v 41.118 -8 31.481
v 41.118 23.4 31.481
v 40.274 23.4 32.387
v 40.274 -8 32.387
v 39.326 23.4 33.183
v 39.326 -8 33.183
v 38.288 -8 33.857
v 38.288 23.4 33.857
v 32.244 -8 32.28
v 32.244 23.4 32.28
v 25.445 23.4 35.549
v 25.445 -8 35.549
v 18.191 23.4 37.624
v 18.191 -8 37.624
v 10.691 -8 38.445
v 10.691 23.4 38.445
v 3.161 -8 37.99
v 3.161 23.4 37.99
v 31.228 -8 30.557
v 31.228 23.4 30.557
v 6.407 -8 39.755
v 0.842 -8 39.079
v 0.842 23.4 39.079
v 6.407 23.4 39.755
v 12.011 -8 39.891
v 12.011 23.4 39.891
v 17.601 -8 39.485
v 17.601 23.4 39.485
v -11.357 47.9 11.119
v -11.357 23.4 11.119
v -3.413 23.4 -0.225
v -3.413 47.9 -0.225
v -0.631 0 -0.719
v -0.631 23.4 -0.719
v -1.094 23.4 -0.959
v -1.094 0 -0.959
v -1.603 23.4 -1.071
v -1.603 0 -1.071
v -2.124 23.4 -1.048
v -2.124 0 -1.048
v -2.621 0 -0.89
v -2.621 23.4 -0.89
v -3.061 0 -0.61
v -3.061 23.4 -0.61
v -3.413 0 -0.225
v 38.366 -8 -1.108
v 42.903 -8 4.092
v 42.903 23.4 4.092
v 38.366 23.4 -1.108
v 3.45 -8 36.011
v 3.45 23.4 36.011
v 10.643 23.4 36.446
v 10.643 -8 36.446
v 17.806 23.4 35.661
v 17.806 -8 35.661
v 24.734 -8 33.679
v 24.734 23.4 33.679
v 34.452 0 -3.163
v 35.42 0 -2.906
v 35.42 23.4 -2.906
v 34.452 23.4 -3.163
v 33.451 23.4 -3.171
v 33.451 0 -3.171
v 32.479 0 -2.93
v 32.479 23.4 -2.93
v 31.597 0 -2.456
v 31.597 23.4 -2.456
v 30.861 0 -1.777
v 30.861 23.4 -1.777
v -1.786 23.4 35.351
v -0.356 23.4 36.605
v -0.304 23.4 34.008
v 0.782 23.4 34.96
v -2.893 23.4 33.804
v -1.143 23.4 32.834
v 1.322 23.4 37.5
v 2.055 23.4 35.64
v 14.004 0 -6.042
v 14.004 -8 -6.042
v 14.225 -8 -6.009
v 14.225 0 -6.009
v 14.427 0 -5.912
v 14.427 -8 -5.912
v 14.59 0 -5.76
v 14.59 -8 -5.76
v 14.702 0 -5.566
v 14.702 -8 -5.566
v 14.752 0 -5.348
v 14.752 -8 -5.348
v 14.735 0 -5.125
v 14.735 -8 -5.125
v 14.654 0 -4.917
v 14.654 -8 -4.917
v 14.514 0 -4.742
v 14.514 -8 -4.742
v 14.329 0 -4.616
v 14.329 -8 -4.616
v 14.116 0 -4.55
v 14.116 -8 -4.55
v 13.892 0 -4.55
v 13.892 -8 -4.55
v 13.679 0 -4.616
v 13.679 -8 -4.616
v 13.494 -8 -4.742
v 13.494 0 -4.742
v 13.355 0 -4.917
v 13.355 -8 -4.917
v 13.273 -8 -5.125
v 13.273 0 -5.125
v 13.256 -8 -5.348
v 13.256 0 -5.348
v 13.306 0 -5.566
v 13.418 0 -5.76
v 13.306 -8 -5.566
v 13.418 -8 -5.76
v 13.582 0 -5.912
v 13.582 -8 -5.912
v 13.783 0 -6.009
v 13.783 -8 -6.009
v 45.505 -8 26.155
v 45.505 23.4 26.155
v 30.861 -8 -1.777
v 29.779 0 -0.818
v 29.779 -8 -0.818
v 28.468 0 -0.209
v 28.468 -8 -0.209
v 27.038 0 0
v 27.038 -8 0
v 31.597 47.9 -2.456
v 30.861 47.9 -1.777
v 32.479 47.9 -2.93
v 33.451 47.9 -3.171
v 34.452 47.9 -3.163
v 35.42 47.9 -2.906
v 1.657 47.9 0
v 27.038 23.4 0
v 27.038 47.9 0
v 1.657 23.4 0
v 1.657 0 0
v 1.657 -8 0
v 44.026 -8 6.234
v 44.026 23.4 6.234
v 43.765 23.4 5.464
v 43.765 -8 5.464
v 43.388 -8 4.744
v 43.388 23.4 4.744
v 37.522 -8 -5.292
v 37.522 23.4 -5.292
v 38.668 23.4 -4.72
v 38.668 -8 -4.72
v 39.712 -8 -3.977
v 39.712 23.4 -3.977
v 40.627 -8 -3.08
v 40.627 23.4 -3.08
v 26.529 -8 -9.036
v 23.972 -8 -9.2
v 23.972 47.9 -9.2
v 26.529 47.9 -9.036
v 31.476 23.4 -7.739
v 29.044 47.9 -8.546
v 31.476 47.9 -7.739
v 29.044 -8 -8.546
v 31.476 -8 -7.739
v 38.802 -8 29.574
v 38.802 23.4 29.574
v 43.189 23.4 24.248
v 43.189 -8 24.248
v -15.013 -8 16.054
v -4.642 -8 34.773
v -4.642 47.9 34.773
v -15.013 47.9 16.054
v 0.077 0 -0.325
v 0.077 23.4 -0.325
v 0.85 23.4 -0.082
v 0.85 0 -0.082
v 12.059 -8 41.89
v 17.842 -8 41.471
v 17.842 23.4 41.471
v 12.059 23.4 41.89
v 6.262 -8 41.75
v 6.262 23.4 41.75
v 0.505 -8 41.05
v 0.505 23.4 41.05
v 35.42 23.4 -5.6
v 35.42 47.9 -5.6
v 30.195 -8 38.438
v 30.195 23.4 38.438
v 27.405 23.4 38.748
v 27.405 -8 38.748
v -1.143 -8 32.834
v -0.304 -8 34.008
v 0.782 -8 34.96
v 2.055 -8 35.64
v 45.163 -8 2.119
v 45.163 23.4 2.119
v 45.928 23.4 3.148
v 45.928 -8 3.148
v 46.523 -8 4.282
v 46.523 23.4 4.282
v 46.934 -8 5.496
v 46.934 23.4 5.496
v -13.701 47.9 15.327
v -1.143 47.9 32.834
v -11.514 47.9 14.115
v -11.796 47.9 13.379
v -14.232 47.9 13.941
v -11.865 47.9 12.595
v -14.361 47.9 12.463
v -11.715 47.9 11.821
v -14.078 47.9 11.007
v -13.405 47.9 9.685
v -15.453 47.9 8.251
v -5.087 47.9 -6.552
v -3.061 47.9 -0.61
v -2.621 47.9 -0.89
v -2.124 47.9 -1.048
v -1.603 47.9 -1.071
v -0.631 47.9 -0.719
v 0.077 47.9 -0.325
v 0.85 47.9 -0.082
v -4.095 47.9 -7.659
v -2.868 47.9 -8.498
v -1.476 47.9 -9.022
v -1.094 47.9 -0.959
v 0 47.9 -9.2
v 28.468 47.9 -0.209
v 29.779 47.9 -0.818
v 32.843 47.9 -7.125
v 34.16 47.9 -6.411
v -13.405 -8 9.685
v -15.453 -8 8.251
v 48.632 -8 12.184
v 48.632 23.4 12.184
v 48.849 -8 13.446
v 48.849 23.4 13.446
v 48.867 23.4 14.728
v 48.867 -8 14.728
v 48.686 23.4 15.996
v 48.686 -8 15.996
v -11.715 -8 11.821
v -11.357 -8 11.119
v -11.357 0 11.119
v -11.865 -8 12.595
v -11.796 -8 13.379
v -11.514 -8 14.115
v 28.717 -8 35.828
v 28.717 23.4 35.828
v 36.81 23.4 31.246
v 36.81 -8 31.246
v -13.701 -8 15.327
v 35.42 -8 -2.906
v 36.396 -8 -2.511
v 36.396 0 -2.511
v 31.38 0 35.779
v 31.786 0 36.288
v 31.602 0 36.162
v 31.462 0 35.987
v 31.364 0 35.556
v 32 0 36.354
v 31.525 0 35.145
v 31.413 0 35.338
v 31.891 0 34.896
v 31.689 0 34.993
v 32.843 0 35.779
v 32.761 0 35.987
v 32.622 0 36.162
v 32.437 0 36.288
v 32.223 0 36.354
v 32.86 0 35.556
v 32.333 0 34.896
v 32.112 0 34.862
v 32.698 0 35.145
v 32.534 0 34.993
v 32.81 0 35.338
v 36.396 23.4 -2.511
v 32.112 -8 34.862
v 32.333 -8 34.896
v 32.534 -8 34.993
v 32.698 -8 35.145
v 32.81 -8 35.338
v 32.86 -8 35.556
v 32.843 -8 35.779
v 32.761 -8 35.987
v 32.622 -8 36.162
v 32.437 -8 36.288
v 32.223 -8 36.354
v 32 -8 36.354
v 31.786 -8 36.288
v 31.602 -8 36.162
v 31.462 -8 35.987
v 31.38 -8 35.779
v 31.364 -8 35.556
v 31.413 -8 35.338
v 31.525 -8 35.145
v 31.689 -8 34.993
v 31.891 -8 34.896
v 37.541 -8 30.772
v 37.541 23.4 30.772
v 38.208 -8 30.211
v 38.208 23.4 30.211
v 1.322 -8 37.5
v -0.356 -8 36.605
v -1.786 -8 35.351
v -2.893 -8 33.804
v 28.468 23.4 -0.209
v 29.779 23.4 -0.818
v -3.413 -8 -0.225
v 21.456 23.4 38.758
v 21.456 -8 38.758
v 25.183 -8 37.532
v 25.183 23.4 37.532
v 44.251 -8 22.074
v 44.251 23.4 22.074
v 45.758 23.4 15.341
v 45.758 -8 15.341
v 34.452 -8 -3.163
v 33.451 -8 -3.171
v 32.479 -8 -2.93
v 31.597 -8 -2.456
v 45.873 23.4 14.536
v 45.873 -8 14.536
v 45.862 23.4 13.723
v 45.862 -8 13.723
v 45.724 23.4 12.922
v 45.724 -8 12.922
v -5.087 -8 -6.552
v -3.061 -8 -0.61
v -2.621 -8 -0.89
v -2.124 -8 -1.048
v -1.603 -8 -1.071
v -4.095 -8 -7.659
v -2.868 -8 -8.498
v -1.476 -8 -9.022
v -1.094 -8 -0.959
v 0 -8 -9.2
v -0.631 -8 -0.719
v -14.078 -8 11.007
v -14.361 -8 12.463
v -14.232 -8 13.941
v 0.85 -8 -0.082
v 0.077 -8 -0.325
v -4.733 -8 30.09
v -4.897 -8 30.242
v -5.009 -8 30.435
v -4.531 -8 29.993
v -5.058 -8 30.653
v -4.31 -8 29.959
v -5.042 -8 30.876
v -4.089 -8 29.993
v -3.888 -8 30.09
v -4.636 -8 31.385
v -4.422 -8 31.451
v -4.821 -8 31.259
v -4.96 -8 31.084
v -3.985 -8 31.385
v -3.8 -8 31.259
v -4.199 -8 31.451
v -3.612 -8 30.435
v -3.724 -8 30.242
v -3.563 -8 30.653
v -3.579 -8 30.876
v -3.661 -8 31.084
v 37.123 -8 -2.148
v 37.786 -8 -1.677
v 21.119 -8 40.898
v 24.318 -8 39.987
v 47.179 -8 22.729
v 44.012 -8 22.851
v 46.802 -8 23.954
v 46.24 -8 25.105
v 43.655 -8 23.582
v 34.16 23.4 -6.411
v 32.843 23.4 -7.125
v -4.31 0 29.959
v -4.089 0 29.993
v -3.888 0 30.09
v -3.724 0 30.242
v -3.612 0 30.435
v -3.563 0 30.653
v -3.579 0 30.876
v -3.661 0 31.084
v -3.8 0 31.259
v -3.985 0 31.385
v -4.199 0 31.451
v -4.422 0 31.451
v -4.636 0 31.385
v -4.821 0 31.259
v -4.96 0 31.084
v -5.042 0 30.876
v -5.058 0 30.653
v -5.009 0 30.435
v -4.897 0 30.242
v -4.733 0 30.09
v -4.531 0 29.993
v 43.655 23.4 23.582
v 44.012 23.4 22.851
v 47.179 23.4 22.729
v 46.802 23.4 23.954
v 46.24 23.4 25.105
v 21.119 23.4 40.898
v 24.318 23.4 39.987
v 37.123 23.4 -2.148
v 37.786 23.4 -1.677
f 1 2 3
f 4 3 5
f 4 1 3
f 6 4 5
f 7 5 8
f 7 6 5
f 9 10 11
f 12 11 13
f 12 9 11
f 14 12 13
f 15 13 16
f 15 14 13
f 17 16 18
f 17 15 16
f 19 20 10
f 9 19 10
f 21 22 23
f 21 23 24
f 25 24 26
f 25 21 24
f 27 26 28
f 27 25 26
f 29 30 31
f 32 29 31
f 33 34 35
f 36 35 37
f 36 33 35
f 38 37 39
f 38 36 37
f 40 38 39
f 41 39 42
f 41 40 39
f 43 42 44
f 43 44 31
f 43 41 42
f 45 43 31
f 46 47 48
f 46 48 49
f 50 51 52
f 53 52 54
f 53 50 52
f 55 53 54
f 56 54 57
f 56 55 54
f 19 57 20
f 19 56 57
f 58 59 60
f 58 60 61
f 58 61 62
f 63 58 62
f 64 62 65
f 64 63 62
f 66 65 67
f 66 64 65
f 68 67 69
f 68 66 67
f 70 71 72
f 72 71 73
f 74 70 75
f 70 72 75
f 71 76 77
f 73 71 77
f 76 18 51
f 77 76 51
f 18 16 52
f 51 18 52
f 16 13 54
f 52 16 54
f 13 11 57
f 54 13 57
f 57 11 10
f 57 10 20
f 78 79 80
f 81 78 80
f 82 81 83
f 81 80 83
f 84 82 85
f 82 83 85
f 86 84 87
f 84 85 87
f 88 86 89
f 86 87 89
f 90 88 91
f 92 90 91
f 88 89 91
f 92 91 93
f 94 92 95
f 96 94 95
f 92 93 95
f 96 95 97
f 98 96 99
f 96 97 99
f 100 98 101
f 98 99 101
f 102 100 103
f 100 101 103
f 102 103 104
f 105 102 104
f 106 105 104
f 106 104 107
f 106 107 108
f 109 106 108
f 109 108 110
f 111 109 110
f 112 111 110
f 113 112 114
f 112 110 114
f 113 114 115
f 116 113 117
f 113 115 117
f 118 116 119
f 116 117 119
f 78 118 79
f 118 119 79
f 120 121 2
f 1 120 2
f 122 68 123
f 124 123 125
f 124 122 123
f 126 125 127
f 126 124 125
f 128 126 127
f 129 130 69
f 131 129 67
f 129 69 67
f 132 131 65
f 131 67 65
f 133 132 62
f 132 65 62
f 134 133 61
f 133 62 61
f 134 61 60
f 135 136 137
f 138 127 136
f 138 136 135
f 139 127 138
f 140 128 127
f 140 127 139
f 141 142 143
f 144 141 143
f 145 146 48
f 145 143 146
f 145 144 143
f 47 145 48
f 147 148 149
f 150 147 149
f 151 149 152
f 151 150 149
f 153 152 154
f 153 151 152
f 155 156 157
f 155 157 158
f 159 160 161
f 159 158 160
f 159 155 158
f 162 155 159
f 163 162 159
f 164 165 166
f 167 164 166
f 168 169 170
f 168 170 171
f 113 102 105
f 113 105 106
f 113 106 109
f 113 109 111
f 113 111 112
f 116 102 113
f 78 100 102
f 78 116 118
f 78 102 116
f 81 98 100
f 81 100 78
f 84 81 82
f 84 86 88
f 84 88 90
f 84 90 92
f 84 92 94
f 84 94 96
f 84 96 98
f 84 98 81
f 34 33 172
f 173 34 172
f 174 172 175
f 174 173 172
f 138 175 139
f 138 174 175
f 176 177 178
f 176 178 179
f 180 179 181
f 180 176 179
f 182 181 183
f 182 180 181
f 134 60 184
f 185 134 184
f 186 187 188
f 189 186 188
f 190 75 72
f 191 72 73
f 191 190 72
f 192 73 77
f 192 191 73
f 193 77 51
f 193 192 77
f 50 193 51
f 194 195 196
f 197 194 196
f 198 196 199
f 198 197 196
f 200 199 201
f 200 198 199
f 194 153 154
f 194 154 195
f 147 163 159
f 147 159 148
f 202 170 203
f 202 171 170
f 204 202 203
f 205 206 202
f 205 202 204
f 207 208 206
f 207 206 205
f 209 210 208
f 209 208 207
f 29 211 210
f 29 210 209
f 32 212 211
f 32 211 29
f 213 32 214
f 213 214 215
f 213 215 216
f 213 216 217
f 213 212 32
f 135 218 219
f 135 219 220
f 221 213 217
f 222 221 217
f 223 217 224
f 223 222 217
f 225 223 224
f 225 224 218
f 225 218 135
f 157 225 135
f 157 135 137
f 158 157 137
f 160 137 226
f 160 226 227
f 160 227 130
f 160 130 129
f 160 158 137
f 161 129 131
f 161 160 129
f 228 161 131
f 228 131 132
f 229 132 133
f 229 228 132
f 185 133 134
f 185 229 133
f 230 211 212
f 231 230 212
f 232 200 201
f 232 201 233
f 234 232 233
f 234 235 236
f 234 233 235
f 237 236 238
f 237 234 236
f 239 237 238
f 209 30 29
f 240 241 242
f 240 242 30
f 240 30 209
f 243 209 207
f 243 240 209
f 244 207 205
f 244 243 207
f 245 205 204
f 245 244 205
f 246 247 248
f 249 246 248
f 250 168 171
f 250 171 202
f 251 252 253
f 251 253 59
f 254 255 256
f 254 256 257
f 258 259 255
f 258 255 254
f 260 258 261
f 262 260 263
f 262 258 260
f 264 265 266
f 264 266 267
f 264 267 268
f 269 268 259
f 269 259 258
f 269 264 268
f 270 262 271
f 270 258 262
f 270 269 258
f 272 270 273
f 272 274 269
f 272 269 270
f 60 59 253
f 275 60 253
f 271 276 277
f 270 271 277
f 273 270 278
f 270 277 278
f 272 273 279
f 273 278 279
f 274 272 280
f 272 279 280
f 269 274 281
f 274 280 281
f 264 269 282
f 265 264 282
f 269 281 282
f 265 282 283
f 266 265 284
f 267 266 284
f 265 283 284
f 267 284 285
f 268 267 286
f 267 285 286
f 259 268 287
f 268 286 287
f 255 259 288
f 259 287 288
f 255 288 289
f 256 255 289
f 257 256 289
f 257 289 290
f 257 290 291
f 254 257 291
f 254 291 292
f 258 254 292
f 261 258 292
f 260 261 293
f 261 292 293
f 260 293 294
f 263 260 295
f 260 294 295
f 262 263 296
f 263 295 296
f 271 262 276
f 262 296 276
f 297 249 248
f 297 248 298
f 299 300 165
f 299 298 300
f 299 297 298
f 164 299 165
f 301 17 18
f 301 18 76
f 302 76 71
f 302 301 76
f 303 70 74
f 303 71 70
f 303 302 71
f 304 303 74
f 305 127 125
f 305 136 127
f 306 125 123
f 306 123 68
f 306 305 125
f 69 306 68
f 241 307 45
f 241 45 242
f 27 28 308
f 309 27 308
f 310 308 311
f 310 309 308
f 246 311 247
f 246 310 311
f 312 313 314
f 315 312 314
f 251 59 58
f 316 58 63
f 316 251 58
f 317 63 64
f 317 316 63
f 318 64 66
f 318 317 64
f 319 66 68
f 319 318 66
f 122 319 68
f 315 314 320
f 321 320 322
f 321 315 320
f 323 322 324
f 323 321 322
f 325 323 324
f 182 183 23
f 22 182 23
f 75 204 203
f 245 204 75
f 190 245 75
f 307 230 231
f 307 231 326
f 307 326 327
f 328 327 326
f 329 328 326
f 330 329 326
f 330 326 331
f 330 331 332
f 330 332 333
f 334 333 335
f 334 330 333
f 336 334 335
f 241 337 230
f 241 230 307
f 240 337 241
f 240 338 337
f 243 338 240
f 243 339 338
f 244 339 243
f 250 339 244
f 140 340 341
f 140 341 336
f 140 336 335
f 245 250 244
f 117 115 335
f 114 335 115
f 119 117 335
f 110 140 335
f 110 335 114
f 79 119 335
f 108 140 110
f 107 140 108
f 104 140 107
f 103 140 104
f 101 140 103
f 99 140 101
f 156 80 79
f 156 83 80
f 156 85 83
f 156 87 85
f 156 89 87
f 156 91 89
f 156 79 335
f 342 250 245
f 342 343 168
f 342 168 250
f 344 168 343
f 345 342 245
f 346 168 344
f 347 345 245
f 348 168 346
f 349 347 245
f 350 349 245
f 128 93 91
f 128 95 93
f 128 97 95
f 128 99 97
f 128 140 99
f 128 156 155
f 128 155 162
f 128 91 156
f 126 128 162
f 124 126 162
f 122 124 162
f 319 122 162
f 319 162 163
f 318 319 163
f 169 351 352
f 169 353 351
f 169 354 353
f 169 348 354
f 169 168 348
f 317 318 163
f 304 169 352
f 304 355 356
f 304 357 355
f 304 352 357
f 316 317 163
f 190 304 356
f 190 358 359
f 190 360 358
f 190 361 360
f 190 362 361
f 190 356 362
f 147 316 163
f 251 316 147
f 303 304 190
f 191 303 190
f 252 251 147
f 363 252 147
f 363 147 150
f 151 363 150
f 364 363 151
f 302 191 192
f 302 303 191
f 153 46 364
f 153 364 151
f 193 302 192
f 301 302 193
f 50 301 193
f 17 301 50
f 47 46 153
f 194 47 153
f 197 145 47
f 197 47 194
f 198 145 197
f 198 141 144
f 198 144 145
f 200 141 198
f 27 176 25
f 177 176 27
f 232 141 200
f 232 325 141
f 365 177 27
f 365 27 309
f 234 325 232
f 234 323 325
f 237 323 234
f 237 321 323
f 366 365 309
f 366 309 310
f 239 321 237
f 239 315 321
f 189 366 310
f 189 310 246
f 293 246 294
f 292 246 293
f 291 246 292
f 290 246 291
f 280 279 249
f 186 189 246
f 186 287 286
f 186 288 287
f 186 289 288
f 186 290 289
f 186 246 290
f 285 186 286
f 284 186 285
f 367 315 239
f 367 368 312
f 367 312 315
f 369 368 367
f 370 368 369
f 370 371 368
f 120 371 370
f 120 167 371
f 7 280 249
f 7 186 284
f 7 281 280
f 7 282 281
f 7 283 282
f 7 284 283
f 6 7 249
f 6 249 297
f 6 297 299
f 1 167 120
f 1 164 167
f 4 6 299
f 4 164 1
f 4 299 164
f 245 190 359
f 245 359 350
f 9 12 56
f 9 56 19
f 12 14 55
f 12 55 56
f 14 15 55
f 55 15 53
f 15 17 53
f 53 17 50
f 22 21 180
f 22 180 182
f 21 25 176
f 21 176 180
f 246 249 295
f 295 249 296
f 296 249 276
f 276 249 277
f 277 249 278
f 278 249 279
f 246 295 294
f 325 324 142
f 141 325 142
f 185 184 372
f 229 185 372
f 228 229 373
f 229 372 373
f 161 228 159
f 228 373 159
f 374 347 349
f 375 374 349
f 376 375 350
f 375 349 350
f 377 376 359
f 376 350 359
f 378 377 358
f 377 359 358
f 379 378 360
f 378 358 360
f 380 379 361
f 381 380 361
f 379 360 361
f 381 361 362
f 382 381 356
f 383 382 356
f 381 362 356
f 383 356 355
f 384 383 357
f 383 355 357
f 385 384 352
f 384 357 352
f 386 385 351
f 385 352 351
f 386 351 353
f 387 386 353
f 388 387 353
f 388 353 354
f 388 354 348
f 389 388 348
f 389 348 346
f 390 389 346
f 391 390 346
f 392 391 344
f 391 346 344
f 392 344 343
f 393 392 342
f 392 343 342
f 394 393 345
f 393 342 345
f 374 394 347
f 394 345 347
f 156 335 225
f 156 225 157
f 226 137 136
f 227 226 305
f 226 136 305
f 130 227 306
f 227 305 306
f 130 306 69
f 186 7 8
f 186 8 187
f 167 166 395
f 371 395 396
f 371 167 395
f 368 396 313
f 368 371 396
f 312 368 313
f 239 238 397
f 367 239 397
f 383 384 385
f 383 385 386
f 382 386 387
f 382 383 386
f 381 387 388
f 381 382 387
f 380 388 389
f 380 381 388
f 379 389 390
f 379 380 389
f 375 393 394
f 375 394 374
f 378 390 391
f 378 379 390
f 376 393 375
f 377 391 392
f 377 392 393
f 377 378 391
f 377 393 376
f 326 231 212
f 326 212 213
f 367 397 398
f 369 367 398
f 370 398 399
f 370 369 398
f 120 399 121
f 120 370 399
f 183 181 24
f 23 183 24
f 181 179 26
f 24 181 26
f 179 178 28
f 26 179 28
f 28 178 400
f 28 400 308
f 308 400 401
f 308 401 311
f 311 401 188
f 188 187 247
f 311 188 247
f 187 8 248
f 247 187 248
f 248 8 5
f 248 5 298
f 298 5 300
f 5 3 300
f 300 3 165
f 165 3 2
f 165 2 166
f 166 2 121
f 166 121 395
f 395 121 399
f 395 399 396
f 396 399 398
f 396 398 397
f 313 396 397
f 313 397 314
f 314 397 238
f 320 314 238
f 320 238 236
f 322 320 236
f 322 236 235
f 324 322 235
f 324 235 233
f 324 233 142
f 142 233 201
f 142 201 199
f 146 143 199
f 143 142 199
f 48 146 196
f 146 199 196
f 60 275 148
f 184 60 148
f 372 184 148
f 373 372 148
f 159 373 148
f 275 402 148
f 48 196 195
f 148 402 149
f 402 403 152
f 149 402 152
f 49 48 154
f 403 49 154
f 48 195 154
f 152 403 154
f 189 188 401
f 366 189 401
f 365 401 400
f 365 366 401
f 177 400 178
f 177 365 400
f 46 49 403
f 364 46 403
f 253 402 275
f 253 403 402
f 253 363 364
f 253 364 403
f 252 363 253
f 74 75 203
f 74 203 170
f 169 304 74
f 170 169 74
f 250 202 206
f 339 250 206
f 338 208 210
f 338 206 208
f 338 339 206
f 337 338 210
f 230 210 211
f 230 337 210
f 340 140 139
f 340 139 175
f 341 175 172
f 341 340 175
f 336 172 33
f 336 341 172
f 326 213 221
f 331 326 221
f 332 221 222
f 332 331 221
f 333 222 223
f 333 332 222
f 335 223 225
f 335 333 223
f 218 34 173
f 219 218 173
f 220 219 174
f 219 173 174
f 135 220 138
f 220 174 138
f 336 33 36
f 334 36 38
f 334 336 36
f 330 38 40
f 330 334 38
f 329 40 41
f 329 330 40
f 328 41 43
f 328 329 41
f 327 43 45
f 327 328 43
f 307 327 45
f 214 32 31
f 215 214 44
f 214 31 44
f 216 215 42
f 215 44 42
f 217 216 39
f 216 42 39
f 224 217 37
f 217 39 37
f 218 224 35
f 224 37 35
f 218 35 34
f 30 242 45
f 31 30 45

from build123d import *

# Parameters (mm, degrees)
BOSS_EXTRUDE1_DEPTH = 23.4
FILLET1_R           = 4
FILLET3_R           = 2
FILLET4_R           = 4
FILLET5_R           = 5
BOSS_EXTRUDE2_DEPTH = 24.5
BOSS_EXTRUDE3_START = 8
SKETCH3_R           = 0.75
BOSS_EXTRUDE3_DEPTH = 8


with BuildPart() as part:
    # Sketch1 → Boss-Extrude1 (new body)
    with BuildSketch(Plane(origin=(0, 0, 0), x_dir=(1, 0, 0), z_dir=(0, 1, 0))):
        with BuildLine():
            Line((0, 0), (30, 0))
            Line((30, 0), (30, 5.1))
            Line((30, 5.1), (36.395958363, 2.511232605))
            ThreePointArc((36.395958363, 2.511232605), (37.463728778, 1.925417586), (38.366240646, 1.107624688))
            Line((38.366240646, 1.107624688), (42.902523658, -4.091619145))
            ThreePointArc((42.902523658, -4.091619145), (43.590417547, -5.096663868), (44.026071732, -6.233993339))
            Line((44.026071732, -6.233993339), (45.723869414, -12.921854211))
            ThreePointArc((45.723869414, -12.921854211), (45.883457457, -14.129266548), (45.7582513, -15.340726954))
            Line((45.7582513, -15.340726954), (44.251223786, -22.074141249))
            ThreePointArc((44.251223786, -22.074141249), (43.848071102, -23.223393532), (43.189020782, -24.247583736))
            Line((43.189020782, -24.247583736), (38.802344779, -29.573658617))
            ThreePointArc((38.802344779, -29.573658617), (37.883123065, -30.501625481), (36.810104599, -31.246422387))
            Line((36.810104599, -31.246422387), (28.716751538, -35.827648886))
            ThreePointArc((28.716751538, -35.827648886), (23.339920043, -38.206219709), (17.601311476, -39.485394366))
            ThreePointArc((17.601311476, -39.485394366), (9.20703571, -39.890619172), (0.842295428, -39.078712278))
            Line((0.842295428, -39.078712278), (0.505393215, -41.050132299))
            ThreePointArc((0.505393215, -41.050132299), (9.158517062, -41.89003057), (17.842194661, -41.470835196))
            ThreePointArc((17.842194661, -41.470835196), (22.730520814, -40.484713163), (27.40515094, -38.748048996))
            Line((27.40515094, -38.748048996), (30.194566538, -38.438407937))
            Line((30.194566538, -38.438407937), (38.287919599, -33.857181439))
            ThreePointArc((38.287919599, -33.857181439), (39.812213821, -32.79914781), (41.11802951, -31.480909053))
            Line((41.11802951, -31.480909053), (45.504705513, -26.154834172))
            ThreePointArc((45.504705513, -26.154834172), (46.543404661, -24.540654707), (47.178795219, -22.729370603))
            Line((47.178795219, -22.729370603), (48.685822733, -15.995956308))
            ThreePointArc((48.685822733, -15.995956308), (48.883154446, -14.086628819), (48.63163501, -12.183681305))
            Line((48.63163501, -12.183681305), (46.933837328, -5.495820434))
            ThreePointArc((46.933837328, -5.495820434), (46.247222637, -3.703327329), (45.163064455, -2.119322184))
            Line((45.163064455, -2.119322184), (40.626781443, 3.07992165))
            ThreePointArc((40.626781443, 3.07992165), (39.204373652, 4.368807735), (37.521509404, 5.292084068))
            Line((37.521509404, 5.292084068), (31.475993381, 7.739009747))
            ThreePointArc((31.475993381, 7.739009747), (27.794609995, 8.831354958), (23.972319774, 9.2))
            Line((23.972319774, 9.2), (0, 9.2))
            ThreePointArc((0, 9.2), (-2.867725571, 8.498272017), (-5.087407296, 6.551663389))
            Line((-5.087407296, 6.551663389), (-15.452573661, -8.251328295))
            Line((-15.452573661, -8.251328295), (-13.40469355, -9.685269386))
            ThreePointArc((-13.40469355, -9.685269386), (-14.36147987, -12.463471121), (-13.70098006, -15.326613615))
            Line((-13.70098006, -15.326613615), (-15.013073156, -16.053532941))
            Line((-15.013073156, -16.053532941), (-4.642357438, -34.772727782))
            Line((-4.642357438, -34.772727782), (-2.892899976, -33.803502014))
            ThreePointArc((-2.892899976, -33.803502014), (-0.356026186, -36.605109272), (3.160716272, -37.98975881))
            ThreePointArc((3.160716272, -37.98975881), (18.191080341, -37.623613679), (32.244088475, -32.279563836))
            Line((32.244088475, -32.279563836), (31.228009552, -30.556896247))
            ThreePointArc((31.228009552, -30.556896247), (17.805759331, -35.661082732), (3.450021006, -36.010793734))
            ThreePointArc((3.450021006, -36.010793734), (0.781528732, -34.960126351), (-1.143442514, -32.834276246))
            Line((-1.143442514, -32.834276246), (-11.514158233, -14.115081405))
            ThreePointArc((-11.514158233, -14.115081405), (-11.864920764, -12.594591782), (-11.35681344, -11.119210477))
            Line((-11.35681344, -11.119210477), (0, 5.1))
            Line((0, 5.1), (0, 0))
        make_face()
    extrude(amount=BOSS_EXTRUDE1_DEPTH)

    # Fillet1
    # the kernel refuses this fillet: 4 mm, written as the material it adds along each edge
    with BuildSketch(Plane(origin=(30, 0, -5.1), x_dir=(0, 0, 1), z_dir=(0, 1, 0))) as fillet1_piece_1:
        with BuildLine():
            CenterArc((5.901400798, 3.918897391), FILLET1_R, 157.964334143, 100.478227364)
            Line((2.193598849, 5.419632112), (2.11944281, 5.449646807))
            Line((2.11944281, 5.449646807), (-0.074156039, 0.030014694))
            Line((-0.074156039, 0.030014694), (0, -0.08))
            ThreePointArc((0, -0.08), (2.55, -0.08), (5.083971984, -0.078377948))
            Line((5.083971984, -0.078377948), (5.1, 0))
        make_face()
    extrude(amount=23.4)

    # Fillet3
    # the kernel refuses this fillet: 2 mm, written as the material it adds along each edge
    with BuildSketch(Plane(origin=(0, 0, -5.1), x_dir=(0, 0, 1), z_dir=(0, 1, 0))) as fillet3_piece_1:
        with BuildLine():
            CenterArc((6.021753736, -1.774928182), FILLET3_R, 117.443704679, 117.556295321)
            Line((4.874600863, -3.41323227), (4.851657806, -3.445998352))
            Line((4.851657806, -3.445998352), (-0.022943057, -0.032766082))
            Line((-0.022943057, -0.032766082), (0, 0.04))
            ThreePointArc((0, 0.04), (2.55, 0.04), (5.081564925, 0.035498564))
            Line((5.081564925, 0.035498564), (5.1, 0))
        make_face()
    extrude(amount=23.4)

    # Fillet4
    fillet4_edges = [part.edges().sort_by_distance(p)[0] for p in [
        (0, 11.7, 0),
    ]]
    fillet(fillet4_edges, radius=FILLET4_R)

    # Fillet5
    fillet5_edges = [part.edges().sort_by_distance(p)[0] for p in [
        (30, 11.7, 0),
    ]]
    fillet(fillet5_edges, radius=FILLET5_R)

    # Sketch2 → Boss-Extrude2 (add)
    with BuildSketch(Plane(origin=(0, 23.4, 0), x_dir=(1, 0, 0), z_dir=(0, 1, 0))):
        with BuildLine():
            Line((-4.642357438, -34.772727782), (-2.892899976, -33.803502014))
            Line((-2.892899976, -33.803502014), (-1.143442514, -32.834276246))
            Line((-1.143442514, -32.834276246), (-11.514158233, -14.115081405))
            ThreePointArc((-11.514158233, -14.115081405), (-11.864920764, -12.594591782), (-11.35681344, -11.119210477))
            Line((-11.35681344, -11.119210477), (-3.41323227, 0.225399137))
            ThreePointArc((-3.41323227, 0.225399137), (-2.124184908, 1.047515098), (-0.631039096, 0.718830843))
            ThreePointArc((-0.631039096, 0.718830843), (0.457713769, 0.183936804), (1.656739075, 0))
            Line((1.656739075, 0), (27.038218008, 0))
            ThreePointArc((27.038218008, 0), (29.145941635, 0.465961942), (30.860817665, 1.776999556))
            ThreePointArc((30.860817665, 1.776999556), (32.957014936, 3.081224878), (35.419632112, 2.906401151))
            Line((35.419632112, 2.906401151), (35.419632112, 5.599970739))
            ThreePointArc((35.419632112, 5.599970739), (33.507981211, 6.780419817), (31.475993381, 7.739009747))
            ThreePointArc((31.475993381, 7.739009747), (27.794609995, 8.831354958), (23.972319774, 9.2))
            Line((23.972319774, 9.2), (0, 9.2))
            ThreePointArc((0, 9.2), (-2.867725571, 8.498272017), (-5.087407296, 6.551663389))
            Line((-5.087407296, 6.551663389), (-15.452573661, -8.251328295))
            Line((-15.452573661, -8.251328295), (-13.40469355, -9.685269386))
            ThreePointArc((-13.40469355, -9.685269386), (-14.36147987, -12.463471121), (-13.70098006, -15.326613615))
            Line((-13.70098006, -15.326613615), (-15.013073156, -16.053532941))
            Line((-15.013073156, -16.053532941), (-4.642357438, -34.772727782))
        make_face()
    extrude(amount=BOSS_EXTRUDE2_DEPTH)

    # Sketch3 → Boss-Extrude3 (add)
    with BuildSketch(Plane.XZ.offset(BOSS_EXTRUDE3_START)):
        with BuildLine():
            Line((27.038218008, 0), (1.656739075, 0))
            ThreePointArc((1.656739075, 0), (0.457713769, -0.183936804), (-0.631039096, -0.718830843))
            ThreePointArc((-0.631039096, -0.718830843), (-2.124184908, -1.047515098), (-3.41323227, -0.225399137))
            Line((-3.41323227, -0.225399137), (-11.35681344, 11.119210477))
            ThreePointArc((-11.35681344, 11.119210477), (-11.864920764, 12.594591782), (-11.514158233, 14.115081405))
            Line((-11.514158233, 14.115081405), (-1.143442514, 32.834276246))
            ThreePointArc((-1.143442514, 32.834276246), (0.781528732, 34.960126351), (3.450021006, 36.010793734))
            ThreePointArc((3.450021006, 36.010793734), (17.805759331, 35.661082732), (31.228009552, 30.556896247))
            Line((31.228009552, 30.556896247), (32.244088475, 32.279563836))
            ThreePointArc((32.244088475, 32.279563836), (18.191080341, 37.623613679), (3.160716272, 37.98975881))
            ThreePointArc((3.160716272, 37.98975881), (-0.356026186, 36.605109272), (-2.892899976, 33.803502014))
            Line((-2.892899976, 33.803502014), (-4.642357438, 34.772727782))
            Line((-4.642357438, 34.772727782), (-15.013073156, 16.053532941))
            Line((-15.013073156, 16.053532941), (-13.70098006, 15.326613615))
            ThreePointArc((-13.70098006, 15.326613615), (-14.36147987, 12.463471121), (-13.40469355, 9.685269386))
            Line((-13.40469355, 9.685269386), (-15.452573661, 8.251328295))
            Line((-15.452573661, 8.251328295), (-5.087407296, -6.551663389))
            ThreePointArc((-5.087407296, -6.551663389), (-2.867725571, -8.498272017), (0, -9.2))
            Line((0, -9.2), (23.972319774, -9.2))
            ThreePointArc((23.972319774, -9.2), (27.794609995, -8.831354958), (31.475993381, -7.739009747))
            Line((31.475993381, -7.739009747), (37.521509404, -5.292084068))
            ThreePointArc((37.521509404, -5.292084068), (39.204373652, -4.368807735), (40.626781443, -3.07992165))
            Line((40.626781443, -3.07992165), (45.163064455, 2.119322184))
            ThreePointArc((45.163064455, 2.119322184), (46.247222637, 3.703327329), (46.933837328, 5.495820434))
            Line((46.933837328, 5.495820434), (48.63163501, 12.183681305))
            ThreePointArc((48.63163501, 12.183681305), (48.883154446, 14.086628819), (48.685822733, 15.995956308))
            Line((48.685822733, 15.995956308), (47.178795219, 22.729370603))
            ThreePointArc((47.178795219, 22.729370603), (46.543404661, 24.540654707), (45.504705513, 26.154834172))
            Line((45.504705513, 26.154834172), (41.11802951, 31.480909053))
            ThreePointArc((41.11802951, 31.480909053), (39.812213821, 32.79914781), (38.287919599, 33.857181439))
            Line((38.287919599, 33.857181439), (30.194566538, 38.438407937))
            Line((30.194566538, 38.438407937), (27.40515094, 38.748048996))
            ThreePointArc((27.40515094, 38.748048996), (22.730520814, 40.484713163), (17.842194661, 41.470835196))
            ThreePointArc((17.842194661, 41.470835196), (9.158517062, 41.89003057), (0.505393215, 41.050132299))
            Line((0.505393215, 41.050132299), (0.842295428, 39.078712278))
            ThreePointArc((0.842295428, 39.078712278), (9.20703571, 39.890619172), (17.601311476, 39.485394366))
            ThreePointArc((17.601311476, 39.485394366), (23.339920043, 38.206219709), (28.716751538, 35.827648886))
            Line((28.716751538, 35.827648886), (36.810104599, 31.246422387))
            ThreePointArc((36.810104599, 31.246422387), (37.883123065, 30.501625481), (38.802344779, 29.573658617))
            Line((38.802344779, 29.573658617), (43.189020782, 24.247583736))
            ThreePointArc((43.189020782, 24.247583736), (43.848071102, 23.223393532), (44.251223786, 22.074141249))
            Line((44.251223786, 22.074141249), (45.7582513, 15.340726954))
            ThreePointArc((45.7582513, 15.340726954), (45.883457457, 14.129266548), (45.723869414, 12.921854211))
            Line((45.723869414, 12.921854211), (44.026071732, 6.233993339))
            ThreePointArc((44.026071732, 6.233993339), (43.590417547, 5.096663868), (42.902523658, 4.091619145))
            Line((42.902523658, 4.091619145), (38.366240646, -1.107624688))
            ThreePointArc((38.366240646, -1.107624688), (37.463728778, -1.925417586), (36.395958363, -2.511232605))
            Line((36.395958363, -2.511232605), (35.419632112, -2.906401151))
            ThreePointArc((35.419632112, -2.906401151), (32.957014936, -3.081224878), (30.860817665, -1.776999556))
            ThreePointArc((30.860817665, -1.776999556), (29.145941635, -0.465961942), (27.038218008, 0))
        make_face()
        with Locations(Location((-4.310418078, 30.709245073, 0), (0, 0, 270))):
            Circle(SKETCH3_R, mode=Mode.SUBTRACT)
        with Locations(Location((32.111644804, 35.612363227, 0), (0, 0, 270))):
            Circle(SKETCH3_R, mode=Mode.SUBTRACT)
        with Locations(Location((14.004070921, -5.292084068, 0), (0, 0, 270))):
            Circle(SKETCH3_R, mode=Mode.SUBTRACT)
    extrude(amount=-BOSS_EXTRUDE3_DEPTH)


solid = part.part
